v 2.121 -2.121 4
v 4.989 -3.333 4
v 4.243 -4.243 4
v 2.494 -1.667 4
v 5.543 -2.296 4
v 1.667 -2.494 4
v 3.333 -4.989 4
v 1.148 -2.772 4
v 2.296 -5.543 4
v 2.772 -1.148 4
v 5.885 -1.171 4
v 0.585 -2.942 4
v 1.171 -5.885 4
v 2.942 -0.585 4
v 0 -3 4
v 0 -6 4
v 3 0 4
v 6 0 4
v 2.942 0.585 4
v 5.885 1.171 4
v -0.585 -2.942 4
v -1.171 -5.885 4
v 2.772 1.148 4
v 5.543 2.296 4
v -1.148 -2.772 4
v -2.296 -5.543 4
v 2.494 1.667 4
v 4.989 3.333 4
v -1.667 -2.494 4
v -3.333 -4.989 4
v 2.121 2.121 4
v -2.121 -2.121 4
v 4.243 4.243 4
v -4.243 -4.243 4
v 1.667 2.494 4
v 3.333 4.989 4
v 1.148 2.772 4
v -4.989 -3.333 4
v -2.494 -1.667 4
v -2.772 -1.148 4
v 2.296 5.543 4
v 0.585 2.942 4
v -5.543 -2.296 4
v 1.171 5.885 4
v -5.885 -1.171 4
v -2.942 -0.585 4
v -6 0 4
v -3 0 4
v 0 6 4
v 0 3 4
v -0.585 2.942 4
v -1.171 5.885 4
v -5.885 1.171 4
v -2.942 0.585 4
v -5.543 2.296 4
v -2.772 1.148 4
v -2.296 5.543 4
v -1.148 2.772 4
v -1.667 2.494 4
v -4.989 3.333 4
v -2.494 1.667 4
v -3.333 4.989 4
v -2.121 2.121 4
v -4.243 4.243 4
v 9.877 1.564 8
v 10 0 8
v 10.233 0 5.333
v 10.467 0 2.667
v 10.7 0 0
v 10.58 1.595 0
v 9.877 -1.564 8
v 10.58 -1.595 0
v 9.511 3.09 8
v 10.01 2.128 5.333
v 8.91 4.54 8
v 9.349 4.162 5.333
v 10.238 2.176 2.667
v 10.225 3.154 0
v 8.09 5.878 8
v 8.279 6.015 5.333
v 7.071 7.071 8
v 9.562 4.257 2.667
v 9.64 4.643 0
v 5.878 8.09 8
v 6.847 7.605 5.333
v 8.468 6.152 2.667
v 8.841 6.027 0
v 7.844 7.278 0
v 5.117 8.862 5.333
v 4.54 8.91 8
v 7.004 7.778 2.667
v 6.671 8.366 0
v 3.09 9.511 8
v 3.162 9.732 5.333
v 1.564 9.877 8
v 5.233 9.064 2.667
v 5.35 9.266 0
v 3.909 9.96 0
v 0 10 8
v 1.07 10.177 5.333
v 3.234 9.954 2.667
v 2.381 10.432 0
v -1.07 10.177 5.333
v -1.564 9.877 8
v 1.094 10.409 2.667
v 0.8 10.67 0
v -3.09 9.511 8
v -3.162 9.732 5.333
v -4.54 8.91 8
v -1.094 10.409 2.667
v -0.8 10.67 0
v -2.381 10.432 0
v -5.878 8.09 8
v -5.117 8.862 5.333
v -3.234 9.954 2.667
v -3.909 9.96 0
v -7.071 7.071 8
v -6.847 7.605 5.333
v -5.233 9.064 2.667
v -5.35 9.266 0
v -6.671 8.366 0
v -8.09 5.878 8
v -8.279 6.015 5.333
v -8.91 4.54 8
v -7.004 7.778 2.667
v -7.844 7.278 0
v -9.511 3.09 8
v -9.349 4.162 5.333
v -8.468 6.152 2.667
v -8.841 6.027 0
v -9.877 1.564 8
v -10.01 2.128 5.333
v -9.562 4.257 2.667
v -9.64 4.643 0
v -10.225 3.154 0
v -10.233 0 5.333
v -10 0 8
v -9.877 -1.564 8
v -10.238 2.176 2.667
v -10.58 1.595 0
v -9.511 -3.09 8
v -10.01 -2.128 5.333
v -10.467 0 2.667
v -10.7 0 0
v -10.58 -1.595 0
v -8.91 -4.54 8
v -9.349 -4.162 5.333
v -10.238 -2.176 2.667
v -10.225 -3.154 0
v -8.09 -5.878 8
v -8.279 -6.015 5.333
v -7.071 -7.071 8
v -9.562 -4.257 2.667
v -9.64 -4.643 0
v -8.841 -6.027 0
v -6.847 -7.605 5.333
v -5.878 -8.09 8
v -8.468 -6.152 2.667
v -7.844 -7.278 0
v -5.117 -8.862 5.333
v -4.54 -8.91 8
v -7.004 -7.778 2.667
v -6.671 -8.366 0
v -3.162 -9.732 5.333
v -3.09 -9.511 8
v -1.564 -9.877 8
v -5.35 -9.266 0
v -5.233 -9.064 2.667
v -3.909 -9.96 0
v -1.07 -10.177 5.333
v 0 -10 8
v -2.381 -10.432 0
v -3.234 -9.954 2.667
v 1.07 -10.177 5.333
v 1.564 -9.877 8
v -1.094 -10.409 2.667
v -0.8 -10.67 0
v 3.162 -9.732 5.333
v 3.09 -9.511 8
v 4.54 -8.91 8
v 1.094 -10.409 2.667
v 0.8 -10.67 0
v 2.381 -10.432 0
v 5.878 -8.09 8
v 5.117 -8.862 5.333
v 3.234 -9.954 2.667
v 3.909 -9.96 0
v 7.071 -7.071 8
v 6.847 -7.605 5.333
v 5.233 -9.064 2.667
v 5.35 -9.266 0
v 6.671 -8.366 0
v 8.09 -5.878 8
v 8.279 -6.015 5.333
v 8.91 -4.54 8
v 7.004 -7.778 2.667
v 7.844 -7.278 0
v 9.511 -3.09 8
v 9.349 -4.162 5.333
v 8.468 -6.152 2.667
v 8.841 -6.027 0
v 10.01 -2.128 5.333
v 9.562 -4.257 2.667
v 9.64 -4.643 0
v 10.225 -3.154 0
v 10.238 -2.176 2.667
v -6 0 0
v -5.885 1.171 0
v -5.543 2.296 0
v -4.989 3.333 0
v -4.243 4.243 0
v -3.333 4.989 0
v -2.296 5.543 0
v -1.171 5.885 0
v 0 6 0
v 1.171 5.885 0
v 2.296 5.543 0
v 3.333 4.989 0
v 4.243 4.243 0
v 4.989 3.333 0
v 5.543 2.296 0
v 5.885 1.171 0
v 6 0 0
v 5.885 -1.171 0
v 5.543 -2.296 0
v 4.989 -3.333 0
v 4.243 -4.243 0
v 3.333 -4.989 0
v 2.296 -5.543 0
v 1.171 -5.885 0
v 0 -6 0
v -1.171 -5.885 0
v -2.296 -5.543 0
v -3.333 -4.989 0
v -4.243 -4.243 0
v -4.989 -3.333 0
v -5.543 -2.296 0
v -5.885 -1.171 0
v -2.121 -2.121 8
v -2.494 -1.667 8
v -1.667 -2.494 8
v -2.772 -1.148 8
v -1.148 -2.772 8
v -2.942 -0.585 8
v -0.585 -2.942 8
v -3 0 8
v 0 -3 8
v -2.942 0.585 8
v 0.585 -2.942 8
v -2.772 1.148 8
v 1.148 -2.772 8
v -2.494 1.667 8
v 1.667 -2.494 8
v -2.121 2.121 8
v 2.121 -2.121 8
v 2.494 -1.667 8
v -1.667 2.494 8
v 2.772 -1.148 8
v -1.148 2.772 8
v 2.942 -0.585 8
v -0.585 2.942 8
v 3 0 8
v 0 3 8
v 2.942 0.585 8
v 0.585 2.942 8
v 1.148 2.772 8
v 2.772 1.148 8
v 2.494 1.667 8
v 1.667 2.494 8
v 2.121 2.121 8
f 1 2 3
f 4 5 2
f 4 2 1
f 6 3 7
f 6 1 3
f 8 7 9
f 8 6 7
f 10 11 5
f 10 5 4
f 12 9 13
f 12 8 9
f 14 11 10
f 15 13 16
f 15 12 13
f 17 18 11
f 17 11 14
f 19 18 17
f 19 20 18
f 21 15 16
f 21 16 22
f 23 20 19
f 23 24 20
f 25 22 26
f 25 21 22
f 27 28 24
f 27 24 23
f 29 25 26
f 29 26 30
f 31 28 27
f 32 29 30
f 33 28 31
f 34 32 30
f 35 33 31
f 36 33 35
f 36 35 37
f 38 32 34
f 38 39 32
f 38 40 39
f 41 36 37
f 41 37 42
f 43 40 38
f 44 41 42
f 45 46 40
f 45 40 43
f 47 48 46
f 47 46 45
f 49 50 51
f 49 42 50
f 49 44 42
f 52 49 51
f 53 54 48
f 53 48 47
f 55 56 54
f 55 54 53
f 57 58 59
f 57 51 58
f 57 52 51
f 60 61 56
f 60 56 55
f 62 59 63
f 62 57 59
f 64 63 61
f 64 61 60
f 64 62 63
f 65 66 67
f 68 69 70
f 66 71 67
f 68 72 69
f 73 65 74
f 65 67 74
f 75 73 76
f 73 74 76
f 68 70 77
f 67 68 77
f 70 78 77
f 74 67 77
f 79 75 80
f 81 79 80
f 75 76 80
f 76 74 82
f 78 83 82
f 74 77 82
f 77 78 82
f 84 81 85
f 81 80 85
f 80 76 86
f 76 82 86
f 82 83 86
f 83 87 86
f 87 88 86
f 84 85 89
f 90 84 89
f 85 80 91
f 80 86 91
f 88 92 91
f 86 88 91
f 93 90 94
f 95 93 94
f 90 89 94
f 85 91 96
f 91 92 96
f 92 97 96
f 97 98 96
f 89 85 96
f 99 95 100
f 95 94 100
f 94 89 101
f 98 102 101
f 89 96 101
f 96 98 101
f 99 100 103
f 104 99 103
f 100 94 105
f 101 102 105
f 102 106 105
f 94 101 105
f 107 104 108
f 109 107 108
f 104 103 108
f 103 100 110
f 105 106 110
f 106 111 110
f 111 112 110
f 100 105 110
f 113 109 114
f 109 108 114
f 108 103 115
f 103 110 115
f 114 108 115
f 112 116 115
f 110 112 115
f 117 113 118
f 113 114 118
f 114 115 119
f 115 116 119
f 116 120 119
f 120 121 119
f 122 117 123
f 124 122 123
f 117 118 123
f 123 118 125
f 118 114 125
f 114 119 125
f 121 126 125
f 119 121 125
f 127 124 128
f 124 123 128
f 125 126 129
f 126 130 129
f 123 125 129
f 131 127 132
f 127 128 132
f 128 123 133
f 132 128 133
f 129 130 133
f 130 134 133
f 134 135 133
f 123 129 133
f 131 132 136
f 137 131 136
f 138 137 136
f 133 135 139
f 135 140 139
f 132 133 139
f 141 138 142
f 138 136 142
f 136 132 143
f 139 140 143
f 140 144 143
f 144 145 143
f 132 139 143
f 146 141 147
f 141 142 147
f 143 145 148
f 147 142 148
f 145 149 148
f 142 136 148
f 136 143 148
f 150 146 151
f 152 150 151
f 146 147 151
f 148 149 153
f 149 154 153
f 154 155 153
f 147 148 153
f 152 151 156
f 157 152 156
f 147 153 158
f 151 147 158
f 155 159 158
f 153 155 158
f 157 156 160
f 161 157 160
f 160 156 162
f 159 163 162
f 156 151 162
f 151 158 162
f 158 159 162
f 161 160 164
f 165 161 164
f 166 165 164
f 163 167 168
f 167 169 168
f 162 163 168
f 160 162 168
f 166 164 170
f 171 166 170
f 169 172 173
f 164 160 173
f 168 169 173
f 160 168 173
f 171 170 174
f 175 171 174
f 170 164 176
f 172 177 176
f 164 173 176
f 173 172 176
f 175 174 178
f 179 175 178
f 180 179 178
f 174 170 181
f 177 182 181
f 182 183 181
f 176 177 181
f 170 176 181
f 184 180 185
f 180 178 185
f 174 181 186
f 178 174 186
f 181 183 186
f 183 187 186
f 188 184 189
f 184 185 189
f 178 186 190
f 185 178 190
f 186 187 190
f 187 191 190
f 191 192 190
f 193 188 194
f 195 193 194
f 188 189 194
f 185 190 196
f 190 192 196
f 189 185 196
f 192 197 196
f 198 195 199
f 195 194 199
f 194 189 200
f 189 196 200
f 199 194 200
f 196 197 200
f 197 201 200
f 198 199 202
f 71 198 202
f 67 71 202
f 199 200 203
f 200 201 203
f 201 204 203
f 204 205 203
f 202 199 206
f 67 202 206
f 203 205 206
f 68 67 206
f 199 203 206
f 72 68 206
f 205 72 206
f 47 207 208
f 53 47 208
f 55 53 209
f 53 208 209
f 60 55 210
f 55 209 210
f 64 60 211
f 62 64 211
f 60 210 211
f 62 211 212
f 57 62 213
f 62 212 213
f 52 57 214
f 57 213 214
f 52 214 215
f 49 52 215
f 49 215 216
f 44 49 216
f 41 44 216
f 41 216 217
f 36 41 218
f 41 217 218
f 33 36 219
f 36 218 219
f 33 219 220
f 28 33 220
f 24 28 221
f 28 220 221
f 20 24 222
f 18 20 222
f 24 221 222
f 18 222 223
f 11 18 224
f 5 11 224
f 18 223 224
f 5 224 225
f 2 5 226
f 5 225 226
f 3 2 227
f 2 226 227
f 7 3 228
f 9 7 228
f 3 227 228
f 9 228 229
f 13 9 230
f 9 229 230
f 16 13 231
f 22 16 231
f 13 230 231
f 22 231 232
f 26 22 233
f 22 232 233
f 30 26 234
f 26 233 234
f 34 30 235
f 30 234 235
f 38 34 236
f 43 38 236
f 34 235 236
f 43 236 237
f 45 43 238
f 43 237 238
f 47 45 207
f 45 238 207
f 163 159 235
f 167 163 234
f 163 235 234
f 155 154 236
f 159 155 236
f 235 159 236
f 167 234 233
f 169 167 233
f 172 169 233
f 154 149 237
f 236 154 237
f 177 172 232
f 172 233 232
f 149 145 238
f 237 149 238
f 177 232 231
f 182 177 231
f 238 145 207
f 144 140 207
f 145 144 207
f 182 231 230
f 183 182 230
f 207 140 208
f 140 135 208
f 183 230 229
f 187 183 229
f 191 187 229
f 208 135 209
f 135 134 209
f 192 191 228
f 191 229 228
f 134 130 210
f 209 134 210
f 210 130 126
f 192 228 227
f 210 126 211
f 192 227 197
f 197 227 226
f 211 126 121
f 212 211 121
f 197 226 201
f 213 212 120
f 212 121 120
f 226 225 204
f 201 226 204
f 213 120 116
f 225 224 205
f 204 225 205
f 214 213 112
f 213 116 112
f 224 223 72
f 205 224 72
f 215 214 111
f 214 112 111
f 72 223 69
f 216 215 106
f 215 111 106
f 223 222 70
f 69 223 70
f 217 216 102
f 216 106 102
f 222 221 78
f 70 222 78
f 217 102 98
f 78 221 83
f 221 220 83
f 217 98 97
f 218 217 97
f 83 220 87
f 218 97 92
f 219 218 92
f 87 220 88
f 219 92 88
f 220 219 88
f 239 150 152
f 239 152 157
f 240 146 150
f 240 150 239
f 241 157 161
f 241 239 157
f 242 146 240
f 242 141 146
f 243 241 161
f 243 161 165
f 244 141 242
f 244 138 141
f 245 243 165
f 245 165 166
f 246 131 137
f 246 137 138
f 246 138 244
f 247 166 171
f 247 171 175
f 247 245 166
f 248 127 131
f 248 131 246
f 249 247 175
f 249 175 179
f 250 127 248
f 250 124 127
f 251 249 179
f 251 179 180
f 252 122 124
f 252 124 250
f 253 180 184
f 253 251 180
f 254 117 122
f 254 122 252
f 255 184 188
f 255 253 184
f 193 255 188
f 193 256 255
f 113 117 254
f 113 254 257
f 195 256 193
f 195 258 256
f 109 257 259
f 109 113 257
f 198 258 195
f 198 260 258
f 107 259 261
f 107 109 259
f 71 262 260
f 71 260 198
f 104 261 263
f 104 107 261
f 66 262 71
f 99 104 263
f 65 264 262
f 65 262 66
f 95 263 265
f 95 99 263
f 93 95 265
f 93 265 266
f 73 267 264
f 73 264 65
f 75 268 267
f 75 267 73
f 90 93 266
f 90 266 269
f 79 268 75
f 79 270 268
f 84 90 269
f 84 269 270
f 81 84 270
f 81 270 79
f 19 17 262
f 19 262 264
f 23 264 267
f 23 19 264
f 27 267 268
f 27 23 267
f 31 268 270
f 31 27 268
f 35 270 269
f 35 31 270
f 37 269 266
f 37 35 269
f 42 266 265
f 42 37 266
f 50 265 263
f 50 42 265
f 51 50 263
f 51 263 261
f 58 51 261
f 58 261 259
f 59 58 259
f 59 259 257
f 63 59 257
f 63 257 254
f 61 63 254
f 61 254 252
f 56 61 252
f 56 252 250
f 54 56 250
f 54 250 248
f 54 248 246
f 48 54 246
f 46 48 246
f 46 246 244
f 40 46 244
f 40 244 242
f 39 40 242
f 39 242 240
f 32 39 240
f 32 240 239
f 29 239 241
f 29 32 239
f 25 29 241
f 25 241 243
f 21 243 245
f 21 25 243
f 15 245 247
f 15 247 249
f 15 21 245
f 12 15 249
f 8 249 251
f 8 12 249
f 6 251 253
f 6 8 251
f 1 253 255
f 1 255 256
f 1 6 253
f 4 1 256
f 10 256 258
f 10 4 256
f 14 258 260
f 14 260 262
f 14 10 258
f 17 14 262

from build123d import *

# Parameters (mm, degrees)
SKETCH_1_R          = 10
SKETCH_1_R_2        = 3
EXTRUDE_1_DEPTH     = 8
DRAFT_1_ANGLE       = 5
SKETCH_2_R          = 6
CUT_EXTRUDE_1_DEPTH = 4


with BuildPart() as part:
    # 草图1 → 凸台-拉伸1 (new body)
    with BuildSketch(Plane.XY):
        Circle(SKETCH_1_R)
        Circle(SKETCH_1_R_2, mode=Mode.SUBTRACT)
    extrude(amount=EXTRUDE_1_DEPTH)

    # 拔模1
    draft_1_faces = [part.faces().sort_by_distance(p)[0] for p in [
        (-10, 0, 4),
    ]]
    draft(draft_1_faces, Plane.XY.offset(8), DRAFT_1_ANGLE)

    # 草图2 → 切除-拉伸1 (cut)
    with BuildSketch(Plane(origin=(0, 0, 0), x_dir=(-1, 0, 0), z_dir=(0, 0, -1))):
        Circle(SKETCH_2_R)
    extrude(amount=-CUT_EXTRUDE_1_DEPTH, mode=Mode.SUBTRACT)


solid = part.part
